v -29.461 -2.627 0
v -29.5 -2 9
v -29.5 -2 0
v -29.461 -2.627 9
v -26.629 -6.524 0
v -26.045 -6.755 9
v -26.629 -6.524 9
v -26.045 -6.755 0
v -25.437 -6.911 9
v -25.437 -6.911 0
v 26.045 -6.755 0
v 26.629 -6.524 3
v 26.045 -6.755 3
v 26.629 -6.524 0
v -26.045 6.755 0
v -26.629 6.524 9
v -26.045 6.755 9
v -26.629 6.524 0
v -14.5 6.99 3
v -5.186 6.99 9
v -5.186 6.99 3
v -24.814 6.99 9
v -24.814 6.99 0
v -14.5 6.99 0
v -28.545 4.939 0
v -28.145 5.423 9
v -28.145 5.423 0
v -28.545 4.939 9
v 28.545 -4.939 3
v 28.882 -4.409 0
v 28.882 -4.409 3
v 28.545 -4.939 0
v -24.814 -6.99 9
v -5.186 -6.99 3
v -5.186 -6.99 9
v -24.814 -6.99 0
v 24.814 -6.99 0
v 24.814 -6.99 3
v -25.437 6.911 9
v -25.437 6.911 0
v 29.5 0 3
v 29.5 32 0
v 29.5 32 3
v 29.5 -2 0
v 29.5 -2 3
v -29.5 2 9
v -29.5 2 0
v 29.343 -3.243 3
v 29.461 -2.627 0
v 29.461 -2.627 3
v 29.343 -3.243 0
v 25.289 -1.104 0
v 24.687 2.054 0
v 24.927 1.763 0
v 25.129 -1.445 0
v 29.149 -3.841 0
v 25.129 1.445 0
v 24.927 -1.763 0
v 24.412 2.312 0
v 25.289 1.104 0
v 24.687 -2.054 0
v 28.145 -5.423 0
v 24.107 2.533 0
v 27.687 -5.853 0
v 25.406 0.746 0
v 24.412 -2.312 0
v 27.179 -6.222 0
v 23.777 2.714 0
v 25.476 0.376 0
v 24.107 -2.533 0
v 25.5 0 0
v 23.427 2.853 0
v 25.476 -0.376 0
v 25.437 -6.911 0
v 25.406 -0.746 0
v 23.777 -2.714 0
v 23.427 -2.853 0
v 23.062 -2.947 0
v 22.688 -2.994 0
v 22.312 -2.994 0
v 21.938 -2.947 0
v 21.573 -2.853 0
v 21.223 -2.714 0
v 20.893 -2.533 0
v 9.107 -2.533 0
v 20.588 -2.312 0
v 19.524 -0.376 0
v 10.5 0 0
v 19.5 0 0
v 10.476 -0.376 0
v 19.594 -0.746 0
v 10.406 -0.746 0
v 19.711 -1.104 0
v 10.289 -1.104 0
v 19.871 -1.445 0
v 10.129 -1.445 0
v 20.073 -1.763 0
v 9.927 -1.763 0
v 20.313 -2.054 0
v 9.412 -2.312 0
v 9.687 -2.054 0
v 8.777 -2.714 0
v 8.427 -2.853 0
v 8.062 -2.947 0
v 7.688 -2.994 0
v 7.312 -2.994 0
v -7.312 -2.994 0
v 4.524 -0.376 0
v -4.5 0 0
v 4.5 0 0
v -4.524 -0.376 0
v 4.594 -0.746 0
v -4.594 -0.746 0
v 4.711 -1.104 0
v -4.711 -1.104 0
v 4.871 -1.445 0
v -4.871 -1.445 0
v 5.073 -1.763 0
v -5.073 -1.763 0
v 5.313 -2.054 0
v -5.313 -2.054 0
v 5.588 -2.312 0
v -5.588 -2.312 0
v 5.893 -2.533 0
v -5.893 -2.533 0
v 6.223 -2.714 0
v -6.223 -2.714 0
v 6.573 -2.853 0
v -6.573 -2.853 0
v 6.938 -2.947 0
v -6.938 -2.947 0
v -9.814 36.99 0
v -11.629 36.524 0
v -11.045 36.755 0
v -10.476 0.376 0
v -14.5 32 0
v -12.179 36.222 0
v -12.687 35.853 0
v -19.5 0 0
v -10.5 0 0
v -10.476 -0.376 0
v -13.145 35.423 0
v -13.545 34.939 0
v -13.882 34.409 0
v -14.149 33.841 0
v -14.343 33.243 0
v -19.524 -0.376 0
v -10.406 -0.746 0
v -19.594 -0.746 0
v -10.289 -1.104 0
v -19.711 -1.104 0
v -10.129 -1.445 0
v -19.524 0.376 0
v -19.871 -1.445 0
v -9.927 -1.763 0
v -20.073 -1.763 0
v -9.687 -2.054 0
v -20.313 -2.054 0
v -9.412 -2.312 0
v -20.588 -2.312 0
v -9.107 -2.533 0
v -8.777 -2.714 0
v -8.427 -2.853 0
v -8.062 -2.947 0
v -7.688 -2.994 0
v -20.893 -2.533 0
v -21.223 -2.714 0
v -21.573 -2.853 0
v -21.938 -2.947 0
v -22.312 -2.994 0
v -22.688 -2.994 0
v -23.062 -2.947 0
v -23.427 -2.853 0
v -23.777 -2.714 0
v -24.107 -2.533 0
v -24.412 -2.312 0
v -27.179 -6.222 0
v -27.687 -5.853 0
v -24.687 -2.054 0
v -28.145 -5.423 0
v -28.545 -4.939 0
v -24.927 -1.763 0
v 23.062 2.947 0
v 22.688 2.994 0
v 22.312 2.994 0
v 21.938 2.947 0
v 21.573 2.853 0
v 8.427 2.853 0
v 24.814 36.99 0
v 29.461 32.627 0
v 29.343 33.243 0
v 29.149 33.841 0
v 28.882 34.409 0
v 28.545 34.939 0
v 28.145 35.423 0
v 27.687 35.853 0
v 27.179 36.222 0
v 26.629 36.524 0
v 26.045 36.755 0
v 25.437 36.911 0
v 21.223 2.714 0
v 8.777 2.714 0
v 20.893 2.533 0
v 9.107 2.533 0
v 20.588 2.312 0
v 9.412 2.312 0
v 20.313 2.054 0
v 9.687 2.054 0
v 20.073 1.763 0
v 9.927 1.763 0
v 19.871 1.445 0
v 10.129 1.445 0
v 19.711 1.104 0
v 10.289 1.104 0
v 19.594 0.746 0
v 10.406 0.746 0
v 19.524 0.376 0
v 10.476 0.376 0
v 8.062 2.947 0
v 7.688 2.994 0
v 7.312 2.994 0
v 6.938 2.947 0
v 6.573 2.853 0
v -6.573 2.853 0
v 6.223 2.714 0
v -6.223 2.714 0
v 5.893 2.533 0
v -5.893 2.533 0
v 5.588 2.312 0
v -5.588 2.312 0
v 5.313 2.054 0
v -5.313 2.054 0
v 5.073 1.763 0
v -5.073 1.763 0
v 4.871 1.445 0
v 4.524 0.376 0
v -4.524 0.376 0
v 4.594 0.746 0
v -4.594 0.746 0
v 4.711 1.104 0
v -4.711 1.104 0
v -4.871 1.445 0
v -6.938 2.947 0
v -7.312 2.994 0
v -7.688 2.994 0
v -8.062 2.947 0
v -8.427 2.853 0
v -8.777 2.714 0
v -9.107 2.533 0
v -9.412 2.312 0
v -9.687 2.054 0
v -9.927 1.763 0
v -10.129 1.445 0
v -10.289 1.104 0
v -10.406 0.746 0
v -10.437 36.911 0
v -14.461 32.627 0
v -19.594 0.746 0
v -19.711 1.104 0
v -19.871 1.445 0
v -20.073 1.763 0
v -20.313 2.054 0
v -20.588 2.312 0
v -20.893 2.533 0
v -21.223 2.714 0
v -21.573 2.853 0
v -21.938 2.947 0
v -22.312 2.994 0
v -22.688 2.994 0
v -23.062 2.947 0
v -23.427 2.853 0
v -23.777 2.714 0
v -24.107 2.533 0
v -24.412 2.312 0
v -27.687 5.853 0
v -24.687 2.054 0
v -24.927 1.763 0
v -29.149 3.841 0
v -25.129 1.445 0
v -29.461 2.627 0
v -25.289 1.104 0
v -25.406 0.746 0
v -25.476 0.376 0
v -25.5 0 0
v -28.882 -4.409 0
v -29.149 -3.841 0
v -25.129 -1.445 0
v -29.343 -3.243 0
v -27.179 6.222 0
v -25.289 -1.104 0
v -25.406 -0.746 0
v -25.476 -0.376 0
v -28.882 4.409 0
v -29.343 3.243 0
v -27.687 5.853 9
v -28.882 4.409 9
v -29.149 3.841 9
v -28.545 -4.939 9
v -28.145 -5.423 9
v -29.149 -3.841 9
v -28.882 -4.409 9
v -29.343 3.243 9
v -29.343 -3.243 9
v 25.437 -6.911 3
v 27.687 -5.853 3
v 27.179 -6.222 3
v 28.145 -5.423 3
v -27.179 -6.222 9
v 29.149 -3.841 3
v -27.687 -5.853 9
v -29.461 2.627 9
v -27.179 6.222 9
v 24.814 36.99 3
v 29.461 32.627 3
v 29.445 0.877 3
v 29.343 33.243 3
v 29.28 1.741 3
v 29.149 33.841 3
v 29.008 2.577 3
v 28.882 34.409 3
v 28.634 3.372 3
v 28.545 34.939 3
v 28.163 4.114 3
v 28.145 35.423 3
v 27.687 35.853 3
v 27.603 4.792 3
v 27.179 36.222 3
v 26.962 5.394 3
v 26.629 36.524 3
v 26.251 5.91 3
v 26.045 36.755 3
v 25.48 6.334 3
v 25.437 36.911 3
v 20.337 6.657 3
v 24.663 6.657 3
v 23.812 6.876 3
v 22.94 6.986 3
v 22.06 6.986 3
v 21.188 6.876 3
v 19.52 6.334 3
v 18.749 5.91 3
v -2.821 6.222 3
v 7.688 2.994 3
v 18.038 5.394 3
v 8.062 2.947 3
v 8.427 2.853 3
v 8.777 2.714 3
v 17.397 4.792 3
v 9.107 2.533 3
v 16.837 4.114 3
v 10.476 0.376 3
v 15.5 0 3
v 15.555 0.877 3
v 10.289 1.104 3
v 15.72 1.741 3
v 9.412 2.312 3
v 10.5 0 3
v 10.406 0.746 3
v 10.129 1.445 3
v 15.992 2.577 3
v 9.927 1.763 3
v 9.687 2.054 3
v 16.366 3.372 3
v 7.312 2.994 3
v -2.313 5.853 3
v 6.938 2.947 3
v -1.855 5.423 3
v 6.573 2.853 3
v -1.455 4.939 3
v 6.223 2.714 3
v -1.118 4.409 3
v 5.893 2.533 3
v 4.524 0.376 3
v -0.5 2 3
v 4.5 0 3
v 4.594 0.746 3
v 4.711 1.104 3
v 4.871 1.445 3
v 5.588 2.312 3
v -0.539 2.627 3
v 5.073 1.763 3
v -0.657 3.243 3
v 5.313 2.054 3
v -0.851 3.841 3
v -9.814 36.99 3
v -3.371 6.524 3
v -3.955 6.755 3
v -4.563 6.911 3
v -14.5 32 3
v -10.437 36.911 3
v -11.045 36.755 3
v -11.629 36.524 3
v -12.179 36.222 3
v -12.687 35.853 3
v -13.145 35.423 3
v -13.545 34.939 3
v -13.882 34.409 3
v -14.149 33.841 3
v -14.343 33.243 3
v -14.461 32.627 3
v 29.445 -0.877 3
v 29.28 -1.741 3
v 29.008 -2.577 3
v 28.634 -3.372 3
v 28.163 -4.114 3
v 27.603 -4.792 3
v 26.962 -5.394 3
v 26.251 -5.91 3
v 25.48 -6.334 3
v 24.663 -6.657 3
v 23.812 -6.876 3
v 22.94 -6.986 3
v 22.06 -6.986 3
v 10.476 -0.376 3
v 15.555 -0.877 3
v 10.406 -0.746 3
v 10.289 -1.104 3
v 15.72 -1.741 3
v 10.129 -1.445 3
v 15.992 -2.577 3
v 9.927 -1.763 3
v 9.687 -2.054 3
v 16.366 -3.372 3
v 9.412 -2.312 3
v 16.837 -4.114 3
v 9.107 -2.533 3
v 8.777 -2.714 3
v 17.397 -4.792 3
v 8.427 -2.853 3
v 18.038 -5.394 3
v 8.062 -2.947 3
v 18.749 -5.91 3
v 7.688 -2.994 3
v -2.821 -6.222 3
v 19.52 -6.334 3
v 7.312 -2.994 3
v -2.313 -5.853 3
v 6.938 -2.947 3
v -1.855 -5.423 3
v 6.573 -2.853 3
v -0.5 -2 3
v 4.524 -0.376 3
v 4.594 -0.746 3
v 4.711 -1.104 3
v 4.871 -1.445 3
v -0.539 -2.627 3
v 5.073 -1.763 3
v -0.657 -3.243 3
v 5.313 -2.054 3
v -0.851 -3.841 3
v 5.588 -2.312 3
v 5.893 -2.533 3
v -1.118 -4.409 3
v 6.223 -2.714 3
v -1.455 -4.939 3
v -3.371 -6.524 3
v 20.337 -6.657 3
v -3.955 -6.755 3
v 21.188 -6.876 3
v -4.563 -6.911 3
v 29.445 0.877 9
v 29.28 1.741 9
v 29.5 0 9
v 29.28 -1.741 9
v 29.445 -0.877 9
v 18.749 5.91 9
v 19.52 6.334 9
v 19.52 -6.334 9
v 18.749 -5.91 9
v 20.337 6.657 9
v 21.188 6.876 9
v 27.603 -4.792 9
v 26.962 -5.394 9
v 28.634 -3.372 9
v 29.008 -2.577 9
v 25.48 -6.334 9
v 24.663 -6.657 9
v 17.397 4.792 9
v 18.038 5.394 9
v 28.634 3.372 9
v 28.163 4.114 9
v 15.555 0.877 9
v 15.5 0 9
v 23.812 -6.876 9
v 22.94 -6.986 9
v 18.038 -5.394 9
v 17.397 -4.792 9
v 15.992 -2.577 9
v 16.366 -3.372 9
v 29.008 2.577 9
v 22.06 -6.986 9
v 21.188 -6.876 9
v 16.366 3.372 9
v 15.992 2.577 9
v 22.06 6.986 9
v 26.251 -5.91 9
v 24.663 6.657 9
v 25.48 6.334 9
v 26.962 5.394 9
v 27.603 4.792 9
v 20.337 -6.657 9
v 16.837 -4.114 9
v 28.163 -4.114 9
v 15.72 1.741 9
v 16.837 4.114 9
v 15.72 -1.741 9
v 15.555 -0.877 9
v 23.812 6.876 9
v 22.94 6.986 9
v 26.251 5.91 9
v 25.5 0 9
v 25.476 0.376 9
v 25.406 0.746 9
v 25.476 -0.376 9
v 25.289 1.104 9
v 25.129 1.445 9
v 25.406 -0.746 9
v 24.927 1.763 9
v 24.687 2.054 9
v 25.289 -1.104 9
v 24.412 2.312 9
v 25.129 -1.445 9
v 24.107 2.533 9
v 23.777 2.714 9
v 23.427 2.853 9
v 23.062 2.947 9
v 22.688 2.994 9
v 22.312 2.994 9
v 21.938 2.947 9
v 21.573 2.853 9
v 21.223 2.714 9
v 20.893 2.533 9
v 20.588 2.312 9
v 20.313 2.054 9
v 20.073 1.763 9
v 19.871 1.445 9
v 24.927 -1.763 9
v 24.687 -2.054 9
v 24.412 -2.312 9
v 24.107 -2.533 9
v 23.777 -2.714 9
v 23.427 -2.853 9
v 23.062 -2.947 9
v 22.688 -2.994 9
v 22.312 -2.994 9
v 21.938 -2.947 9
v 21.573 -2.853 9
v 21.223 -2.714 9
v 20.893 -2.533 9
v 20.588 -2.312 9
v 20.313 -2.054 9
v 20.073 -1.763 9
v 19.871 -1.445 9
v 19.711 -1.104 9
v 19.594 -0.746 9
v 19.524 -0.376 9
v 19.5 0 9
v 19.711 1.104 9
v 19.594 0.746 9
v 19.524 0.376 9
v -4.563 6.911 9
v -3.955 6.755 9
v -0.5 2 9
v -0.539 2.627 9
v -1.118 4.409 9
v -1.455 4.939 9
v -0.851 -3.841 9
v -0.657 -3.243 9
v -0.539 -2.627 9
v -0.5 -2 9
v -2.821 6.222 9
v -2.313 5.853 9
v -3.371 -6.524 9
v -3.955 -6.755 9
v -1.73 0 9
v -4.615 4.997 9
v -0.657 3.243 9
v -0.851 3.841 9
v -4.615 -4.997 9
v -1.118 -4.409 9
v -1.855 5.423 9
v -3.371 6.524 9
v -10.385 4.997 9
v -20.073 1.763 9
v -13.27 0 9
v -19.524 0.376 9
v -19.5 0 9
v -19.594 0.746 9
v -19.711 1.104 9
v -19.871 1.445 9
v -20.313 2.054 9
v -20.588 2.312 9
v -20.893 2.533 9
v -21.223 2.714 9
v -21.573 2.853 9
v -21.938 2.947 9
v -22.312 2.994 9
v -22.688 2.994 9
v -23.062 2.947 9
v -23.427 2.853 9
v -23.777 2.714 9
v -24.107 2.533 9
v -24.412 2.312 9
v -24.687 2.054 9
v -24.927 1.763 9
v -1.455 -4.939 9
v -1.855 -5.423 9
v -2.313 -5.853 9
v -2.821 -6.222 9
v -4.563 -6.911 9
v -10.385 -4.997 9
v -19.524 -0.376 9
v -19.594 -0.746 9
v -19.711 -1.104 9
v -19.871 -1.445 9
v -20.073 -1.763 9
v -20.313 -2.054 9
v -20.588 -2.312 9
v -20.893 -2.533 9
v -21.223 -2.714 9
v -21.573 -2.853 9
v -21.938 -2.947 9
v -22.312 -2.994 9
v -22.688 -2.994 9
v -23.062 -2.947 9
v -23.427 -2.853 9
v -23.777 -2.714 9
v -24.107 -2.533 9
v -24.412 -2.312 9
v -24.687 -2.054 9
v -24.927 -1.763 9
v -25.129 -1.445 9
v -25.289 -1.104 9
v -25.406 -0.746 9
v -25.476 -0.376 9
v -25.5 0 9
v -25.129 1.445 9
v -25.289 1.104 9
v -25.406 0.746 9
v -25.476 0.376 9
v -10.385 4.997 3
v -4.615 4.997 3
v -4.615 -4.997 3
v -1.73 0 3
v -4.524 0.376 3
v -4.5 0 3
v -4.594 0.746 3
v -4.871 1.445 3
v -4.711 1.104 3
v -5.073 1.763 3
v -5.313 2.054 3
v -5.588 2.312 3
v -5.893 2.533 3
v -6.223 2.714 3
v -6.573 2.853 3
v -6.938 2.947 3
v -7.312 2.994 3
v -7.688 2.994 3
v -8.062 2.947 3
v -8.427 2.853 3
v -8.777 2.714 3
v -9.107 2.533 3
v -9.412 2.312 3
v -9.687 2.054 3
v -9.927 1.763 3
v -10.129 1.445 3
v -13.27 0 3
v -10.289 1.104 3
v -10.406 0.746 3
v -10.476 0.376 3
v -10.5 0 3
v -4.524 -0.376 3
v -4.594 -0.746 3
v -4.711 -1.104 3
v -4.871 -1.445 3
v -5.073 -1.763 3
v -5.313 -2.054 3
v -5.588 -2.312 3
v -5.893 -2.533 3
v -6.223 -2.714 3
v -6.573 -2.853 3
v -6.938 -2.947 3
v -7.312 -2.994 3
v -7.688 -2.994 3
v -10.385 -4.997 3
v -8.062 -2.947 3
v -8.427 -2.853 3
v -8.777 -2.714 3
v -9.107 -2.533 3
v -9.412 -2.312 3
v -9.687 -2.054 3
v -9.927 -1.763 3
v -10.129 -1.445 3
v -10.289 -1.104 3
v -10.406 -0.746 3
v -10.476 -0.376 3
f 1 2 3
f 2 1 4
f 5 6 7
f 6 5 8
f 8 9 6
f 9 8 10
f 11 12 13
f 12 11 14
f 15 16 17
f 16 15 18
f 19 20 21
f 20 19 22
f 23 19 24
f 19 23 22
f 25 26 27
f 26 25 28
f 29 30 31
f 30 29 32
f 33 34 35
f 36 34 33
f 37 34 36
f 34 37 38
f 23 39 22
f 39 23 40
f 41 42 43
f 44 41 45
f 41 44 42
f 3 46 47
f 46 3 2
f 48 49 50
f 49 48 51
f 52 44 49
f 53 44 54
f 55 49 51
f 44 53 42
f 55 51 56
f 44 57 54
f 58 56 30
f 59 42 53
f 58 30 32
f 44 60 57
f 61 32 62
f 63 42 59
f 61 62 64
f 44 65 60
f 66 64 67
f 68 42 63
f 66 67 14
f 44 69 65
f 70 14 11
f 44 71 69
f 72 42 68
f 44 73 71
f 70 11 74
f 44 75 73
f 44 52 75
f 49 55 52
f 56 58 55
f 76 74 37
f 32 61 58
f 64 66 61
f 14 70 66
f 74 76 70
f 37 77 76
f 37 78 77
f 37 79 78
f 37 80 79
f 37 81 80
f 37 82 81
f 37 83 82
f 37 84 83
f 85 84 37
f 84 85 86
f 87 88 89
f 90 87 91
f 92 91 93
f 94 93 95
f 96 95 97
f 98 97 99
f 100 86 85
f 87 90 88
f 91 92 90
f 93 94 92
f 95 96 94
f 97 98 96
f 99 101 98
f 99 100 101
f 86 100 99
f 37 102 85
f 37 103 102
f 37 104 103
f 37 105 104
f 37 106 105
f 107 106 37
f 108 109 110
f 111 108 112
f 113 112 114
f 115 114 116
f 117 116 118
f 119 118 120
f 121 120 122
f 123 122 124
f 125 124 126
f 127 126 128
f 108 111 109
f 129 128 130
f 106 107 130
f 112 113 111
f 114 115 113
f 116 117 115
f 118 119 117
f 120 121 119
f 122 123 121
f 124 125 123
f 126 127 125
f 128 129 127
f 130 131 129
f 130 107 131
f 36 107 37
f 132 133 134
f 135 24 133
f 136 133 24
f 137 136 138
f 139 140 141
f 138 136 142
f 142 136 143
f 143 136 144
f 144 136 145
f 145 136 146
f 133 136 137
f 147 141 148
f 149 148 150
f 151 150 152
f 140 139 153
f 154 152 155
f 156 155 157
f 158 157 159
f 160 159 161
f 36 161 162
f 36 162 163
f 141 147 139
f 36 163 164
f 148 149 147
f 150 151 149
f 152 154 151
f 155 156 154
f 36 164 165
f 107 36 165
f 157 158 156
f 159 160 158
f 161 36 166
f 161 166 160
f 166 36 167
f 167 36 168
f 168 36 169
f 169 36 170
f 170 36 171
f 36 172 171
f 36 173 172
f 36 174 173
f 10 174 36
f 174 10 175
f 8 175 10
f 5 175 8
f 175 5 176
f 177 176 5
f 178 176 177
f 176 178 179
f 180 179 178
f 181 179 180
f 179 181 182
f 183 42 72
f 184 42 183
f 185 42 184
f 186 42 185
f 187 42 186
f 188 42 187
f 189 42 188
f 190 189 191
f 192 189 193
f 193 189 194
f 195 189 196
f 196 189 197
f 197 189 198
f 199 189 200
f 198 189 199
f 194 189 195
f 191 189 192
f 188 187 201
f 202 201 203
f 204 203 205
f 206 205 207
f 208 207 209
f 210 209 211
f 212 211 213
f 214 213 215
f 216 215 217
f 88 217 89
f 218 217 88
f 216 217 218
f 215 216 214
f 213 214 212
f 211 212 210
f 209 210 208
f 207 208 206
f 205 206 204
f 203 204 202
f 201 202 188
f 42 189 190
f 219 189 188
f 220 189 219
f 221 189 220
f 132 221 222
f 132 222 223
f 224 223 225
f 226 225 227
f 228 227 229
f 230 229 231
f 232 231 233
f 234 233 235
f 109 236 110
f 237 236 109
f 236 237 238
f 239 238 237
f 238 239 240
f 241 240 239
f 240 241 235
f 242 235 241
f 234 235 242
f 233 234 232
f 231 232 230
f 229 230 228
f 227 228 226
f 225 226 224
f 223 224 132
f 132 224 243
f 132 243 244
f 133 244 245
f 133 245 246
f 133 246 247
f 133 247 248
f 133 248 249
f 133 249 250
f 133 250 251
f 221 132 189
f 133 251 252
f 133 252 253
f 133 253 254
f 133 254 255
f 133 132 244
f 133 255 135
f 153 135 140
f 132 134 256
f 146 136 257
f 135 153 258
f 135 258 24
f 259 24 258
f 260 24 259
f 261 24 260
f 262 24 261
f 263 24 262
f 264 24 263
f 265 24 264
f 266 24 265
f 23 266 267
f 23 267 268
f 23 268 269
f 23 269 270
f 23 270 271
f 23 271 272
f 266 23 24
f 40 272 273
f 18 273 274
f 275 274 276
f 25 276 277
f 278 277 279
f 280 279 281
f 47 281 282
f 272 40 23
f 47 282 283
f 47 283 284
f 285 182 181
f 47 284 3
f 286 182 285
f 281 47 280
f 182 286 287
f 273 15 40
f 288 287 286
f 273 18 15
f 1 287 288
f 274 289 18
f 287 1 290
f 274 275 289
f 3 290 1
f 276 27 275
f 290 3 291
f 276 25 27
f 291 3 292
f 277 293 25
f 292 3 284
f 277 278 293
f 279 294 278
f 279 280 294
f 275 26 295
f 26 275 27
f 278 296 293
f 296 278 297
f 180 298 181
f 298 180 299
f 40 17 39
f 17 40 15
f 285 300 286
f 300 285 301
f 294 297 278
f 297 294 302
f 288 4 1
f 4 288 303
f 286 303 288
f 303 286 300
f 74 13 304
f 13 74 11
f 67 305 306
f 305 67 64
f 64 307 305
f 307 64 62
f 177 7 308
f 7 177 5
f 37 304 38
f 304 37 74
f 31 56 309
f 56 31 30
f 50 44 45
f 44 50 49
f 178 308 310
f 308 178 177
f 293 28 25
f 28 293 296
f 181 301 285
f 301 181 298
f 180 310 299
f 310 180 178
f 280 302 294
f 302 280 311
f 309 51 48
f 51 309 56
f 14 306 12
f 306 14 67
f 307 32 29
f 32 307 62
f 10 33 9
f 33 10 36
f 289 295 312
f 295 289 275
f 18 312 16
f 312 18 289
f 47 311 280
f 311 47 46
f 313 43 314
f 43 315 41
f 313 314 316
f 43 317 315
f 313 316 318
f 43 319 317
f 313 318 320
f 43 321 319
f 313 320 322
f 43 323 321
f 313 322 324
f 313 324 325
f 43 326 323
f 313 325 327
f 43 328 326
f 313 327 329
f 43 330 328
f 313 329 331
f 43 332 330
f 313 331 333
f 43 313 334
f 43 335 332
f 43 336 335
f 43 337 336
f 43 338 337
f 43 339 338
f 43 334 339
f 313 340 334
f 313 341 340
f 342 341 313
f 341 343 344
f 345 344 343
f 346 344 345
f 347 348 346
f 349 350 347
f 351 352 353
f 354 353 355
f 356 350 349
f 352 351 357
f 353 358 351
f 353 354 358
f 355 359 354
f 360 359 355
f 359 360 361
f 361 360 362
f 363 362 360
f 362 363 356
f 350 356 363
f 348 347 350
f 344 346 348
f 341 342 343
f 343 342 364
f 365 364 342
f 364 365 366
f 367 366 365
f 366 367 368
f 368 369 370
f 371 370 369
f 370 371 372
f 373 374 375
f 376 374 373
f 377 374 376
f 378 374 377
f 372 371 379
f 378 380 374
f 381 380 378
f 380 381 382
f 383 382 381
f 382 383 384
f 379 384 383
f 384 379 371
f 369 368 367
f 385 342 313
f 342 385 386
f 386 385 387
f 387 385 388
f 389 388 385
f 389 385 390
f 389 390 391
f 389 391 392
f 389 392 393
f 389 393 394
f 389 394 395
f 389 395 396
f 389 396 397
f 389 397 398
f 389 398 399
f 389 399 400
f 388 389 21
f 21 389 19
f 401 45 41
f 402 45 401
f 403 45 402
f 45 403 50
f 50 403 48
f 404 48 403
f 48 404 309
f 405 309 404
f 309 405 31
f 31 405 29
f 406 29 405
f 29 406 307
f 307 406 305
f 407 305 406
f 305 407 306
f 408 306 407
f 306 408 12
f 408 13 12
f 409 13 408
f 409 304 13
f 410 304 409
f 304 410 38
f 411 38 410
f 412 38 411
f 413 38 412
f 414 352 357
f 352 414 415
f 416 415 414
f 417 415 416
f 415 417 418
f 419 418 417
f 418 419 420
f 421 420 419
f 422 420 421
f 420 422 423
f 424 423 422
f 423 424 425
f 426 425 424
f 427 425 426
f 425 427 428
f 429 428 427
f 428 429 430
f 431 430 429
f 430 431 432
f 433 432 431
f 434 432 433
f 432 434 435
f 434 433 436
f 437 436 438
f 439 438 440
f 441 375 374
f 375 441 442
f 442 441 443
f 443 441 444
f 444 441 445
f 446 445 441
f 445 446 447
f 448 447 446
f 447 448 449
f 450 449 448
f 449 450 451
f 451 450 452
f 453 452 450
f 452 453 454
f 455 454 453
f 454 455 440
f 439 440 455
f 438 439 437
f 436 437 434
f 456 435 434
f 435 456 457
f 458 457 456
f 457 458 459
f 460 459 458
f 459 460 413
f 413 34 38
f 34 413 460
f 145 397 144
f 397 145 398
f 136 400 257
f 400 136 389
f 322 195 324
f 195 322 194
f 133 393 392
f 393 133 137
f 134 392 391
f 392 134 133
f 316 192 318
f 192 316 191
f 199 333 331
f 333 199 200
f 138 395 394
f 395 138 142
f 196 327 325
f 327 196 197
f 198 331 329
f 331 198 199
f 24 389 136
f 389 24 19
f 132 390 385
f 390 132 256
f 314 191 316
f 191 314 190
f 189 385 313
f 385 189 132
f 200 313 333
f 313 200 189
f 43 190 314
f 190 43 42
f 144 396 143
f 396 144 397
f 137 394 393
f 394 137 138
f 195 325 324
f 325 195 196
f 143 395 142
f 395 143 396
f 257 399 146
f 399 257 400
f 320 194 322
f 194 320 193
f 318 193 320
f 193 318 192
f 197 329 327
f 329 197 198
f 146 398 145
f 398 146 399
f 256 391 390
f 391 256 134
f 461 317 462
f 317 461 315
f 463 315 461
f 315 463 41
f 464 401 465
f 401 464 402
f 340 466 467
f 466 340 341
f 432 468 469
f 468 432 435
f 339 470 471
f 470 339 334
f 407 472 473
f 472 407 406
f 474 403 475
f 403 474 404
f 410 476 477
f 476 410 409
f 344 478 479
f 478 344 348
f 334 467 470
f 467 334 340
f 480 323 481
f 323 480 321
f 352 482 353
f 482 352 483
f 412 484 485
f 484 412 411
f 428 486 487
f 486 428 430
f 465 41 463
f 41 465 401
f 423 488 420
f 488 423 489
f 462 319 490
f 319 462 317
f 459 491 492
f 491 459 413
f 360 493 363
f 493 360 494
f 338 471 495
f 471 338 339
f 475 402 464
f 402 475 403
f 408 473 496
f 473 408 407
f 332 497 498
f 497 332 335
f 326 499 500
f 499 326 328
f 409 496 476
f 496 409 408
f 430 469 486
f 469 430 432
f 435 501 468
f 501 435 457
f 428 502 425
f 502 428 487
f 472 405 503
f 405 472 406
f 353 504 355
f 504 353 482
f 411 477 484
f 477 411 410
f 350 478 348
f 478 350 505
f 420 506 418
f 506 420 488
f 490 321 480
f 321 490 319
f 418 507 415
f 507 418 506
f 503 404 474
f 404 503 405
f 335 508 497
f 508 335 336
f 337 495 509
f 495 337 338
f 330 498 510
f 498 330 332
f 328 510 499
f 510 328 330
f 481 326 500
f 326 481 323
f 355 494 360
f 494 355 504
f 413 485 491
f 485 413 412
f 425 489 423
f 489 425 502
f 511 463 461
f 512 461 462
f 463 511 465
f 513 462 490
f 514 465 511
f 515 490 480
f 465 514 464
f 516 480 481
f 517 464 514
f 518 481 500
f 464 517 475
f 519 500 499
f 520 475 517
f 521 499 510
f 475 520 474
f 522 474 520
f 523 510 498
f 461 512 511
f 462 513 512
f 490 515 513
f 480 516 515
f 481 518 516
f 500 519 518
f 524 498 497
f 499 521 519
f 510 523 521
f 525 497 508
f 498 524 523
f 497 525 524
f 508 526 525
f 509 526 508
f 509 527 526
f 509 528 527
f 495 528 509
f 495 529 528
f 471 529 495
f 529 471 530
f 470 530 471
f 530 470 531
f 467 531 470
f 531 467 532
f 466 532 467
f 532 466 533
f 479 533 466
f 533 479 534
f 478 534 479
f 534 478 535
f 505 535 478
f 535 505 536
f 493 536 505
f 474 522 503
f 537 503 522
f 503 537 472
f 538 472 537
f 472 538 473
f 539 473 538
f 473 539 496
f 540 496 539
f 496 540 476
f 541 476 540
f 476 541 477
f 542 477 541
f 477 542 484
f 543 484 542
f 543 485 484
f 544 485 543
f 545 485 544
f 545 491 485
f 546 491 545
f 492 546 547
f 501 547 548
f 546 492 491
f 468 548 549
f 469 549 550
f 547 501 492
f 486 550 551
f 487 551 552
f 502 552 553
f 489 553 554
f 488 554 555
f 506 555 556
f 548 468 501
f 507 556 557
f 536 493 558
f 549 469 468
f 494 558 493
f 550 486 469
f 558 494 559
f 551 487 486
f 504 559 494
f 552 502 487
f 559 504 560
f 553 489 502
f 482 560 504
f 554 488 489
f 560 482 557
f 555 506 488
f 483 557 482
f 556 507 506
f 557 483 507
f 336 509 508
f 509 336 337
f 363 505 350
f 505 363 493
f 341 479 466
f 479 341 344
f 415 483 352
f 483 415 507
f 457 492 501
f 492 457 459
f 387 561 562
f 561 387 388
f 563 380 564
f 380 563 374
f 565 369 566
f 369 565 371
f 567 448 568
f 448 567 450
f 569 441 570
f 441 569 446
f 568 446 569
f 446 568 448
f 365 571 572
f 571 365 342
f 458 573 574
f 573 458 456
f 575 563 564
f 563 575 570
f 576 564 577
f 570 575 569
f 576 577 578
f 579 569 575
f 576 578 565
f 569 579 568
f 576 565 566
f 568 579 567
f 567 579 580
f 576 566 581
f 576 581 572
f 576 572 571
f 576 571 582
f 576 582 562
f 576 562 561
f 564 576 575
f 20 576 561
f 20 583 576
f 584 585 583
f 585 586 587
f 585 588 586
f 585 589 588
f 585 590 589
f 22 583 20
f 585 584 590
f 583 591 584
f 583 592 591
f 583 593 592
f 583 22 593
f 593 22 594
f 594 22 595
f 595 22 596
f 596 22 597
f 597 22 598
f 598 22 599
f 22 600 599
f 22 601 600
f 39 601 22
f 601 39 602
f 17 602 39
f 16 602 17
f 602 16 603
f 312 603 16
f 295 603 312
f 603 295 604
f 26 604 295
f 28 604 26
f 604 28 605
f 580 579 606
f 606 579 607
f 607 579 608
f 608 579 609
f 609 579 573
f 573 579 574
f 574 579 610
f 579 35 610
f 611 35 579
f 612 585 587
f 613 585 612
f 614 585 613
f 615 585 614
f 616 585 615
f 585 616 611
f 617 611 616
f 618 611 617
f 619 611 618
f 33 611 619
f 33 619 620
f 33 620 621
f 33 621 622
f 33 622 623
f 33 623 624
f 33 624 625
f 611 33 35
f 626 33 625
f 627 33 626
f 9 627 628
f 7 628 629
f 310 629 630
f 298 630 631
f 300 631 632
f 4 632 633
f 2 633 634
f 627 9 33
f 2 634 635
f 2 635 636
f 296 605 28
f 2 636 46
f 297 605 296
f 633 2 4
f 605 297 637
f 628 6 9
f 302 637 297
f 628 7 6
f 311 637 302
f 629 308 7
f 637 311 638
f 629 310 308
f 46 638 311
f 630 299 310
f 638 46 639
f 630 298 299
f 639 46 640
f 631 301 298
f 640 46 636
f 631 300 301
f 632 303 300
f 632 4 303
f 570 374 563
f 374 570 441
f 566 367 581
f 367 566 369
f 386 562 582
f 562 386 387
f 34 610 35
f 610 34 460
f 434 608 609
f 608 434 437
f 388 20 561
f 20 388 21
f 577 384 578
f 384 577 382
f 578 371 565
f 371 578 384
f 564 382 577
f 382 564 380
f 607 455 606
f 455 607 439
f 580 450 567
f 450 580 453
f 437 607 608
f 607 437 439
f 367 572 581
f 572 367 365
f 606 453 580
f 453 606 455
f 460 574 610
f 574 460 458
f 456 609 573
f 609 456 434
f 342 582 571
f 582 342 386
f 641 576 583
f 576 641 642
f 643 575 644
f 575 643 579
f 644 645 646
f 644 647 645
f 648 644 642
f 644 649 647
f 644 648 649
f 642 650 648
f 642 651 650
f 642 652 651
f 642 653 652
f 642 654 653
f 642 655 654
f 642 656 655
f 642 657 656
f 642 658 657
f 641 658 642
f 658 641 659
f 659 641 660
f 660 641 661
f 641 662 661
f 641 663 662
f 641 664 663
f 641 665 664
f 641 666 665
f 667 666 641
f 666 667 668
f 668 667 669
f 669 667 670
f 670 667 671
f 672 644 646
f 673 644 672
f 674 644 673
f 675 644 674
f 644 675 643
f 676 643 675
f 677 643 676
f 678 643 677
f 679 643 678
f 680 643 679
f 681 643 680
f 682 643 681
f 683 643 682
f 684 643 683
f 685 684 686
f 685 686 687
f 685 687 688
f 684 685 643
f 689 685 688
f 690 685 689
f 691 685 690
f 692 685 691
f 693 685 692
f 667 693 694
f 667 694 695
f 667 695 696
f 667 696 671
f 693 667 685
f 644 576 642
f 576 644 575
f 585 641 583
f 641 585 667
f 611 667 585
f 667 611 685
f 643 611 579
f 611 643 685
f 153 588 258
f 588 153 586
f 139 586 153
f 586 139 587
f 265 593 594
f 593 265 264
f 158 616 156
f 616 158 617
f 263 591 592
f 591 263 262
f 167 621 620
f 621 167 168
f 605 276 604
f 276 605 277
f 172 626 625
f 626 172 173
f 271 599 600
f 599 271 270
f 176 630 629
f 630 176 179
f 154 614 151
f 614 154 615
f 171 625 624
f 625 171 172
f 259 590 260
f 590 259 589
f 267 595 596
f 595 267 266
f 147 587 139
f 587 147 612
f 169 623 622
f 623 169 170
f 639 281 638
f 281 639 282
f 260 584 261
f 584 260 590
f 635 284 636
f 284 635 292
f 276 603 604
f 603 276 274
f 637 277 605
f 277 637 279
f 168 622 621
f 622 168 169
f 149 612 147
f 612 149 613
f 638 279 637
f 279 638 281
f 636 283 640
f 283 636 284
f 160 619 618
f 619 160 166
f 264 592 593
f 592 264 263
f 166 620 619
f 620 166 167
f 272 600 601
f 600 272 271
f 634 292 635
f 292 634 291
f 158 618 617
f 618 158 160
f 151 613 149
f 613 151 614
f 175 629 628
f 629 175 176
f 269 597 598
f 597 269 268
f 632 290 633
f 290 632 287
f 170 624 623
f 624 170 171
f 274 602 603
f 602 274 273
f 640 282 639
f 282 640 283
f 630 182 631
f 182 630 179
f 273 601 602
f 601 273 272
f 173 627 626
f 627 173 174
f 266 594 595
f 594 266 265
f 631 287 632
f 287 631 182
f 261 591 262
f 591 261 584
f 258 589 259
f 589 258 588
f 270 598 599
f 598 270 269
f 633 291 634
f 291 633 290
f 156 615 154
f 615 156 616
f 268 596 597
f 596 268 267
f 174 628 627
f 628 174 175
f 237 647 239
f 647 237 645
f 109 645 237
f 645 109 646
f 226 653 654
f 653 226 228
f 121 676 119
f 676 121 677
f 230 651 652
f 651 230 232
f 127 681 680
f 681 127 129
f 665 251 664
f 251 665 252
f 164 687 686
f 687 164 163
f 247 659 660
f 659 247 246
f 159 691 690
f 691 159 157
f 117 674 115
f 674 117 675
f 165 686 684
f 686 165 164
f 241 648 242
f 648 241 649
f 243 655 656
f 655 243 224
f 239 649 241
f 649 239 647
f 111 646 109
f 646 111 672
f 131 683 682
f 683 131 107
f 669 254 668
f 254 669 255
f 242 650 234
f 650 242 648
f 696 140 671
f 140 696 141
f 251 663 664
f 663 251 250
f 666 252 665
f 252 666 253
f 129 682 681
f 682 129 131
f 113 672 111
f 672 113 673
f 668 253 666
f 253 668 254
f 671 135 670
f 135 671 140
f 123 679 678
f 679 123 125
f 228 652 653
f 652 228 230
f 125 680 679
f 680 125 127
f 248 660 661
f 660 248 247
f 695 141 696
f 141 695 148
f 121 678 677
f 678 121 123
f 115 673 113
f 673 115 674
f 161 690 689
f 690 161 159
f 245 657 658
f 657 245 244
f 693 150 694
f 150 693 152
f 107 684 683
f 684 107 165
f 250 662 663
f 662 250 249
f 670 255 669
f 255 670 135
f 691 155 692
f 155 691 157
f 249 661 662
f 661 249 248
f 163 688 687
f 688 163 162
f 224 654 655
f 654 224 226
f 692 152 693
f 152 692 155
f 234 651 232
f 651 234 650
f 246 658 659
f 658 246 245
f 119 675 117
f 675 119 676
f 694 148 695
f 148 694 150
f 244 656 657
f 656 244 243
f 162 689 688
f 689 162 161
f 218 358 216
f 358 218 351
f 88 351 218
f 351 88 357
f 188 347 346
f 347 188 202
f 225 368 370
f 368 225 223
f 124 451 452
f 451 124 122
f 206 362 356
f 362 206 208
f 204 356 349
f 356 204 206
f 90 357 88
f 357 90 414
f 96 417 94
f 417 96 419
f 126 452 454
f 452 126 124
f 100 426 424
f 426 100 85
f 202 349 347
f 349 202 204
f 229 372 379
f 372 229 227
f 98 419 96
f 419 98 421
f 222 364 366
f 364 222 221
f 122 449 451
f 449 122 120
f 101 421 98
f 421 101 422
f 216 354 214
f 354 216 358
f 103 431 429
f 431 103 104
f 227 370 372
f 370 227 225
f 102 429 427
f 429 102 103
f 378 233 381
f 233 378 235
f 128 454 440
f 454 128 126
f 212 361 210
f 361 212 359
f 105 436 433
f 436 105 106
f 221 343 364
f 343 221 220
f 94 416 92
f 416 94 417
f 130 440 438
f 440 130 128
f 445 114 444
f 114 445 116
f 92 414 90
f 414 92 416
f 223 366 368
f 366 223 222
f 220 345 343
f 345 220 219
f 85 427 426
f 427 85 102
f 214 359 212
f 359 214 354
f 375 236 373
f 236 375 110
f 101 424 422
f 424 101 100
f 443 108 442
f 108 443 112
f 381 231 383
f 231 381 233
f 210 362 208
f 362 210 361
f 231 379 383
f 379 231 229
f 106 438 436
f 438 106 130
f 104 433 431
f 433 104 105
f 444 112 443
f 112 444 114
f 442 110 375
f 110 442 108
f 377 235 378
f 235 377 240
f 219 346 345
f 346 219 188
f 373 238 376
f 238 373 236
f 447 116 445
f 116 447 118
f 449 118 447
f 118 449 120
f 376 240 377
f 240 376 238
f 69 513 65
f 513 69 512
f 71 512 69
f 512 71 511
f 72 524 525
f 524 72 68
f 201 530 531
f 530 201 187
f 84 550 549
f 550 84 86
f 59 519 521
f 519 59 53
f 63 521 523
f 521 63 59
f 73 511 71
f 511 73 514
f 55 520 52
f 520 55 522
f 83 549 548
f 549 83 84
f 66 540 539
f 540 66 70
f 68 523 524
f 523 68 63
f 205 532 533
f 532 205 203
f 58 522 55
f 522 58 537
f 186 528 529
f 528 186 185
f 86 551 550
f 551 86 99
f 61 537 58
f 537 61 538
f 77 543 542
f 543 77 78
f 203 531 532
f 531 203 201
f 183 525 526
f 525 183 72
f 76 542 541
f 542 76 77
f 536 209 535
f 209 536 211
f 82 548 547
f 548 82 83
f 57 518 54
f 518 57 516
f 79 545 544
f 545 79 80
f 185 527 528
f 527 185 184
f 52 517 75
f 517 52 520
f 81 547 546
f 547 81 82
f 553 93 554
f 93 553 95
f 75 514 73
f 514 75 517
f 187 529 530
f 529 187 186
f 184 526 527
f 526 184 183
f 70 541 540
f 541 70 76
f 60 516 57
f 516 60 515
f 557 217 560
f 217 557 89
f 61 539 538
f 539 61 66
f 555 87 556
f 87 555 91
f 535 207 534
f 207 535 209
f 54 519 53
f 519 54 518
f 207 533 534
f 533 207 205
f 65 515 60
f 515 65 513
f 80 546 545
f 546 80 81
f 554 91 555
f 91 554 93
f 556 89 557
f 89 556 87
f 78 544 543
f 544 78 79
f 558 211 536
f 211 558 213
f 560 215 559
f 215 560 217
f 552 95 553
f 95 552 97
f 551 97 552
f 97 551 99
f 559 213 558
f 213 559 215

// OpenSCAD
$fn = 50;


difference() {
	union() {
		hull() {
			translate(v = [-24.5000000000, 2.0000000000, 0]) {
				cylinder(h = 3, r = 5);
			}
			translate(v = [24.5000000000, 2.0000000000, 0]) {
				cylinder(h = 3, r = 5);
			}
			translate(v = [-24.5000000000, -2.0000000000, 0]) {
				cylinder(h = 3, r = 5);
			}
			translate(v = [24.5000000000, -2.0000000000, 0]) {
				cylinder(h = 3, r = 5);
			}
		}
		translate(v = [7.5000000000, 15.0000000000, 0]) {
			hull() {
				translate(v = [-17.0000000000, 17.0000000000, 0]) {
					cylinder(h = 3, r = 5);
				}
				translate(v = [17.0000000000, 17.0000000000, 0]) {
					cylinder(h = 3, r = 5);
				}
				translate(v = [-17.0000000000, -17.0000000000, 0]) {
					cylinder(h = 3, r = 5);
				}
				translate(v = [17.0000000000, -17.0000000000, 0]) {
					cylinder(h = 3, r = 5);
				}
			}
		}
		translate(v = [22.5000000000, 0, 0]) {
			cylinder(h = 9, r = 7.0000000000);
		}
		translate(v = [-15.0000000000, 0, 0]) {
			hull() {
				translate(v = [-9.5000000000, 2.0000000000, 0]) {
					cylinder(h = 9, r = 5);
				}
				translate(v = [9.5000000000, 2.0000000000, 0]) {
					cylinder(h = 9, r = 5);
				}
				translate(v = [-9.5000000000, -2.0000000000, 0]) {
					cylinder(h = 9, r = 5);
				}
				translate(v = [9.5000000000, -2.0000000000, 0]) {
					cylinder(h = 9, r = 5);
				}
			}
		}
	}
	union() {
		translate(v = [-7.5000000000, 0, 9]) {
			rotate(a = [0, 0, 0]) {
				difference() {
					union() {
						translate(v = [0, 0, -6]) {
							linear_extrude(height = 6) {
								polygon(points = [[5.7700000000, 0.0000000000], [2.8850000000, 4.9969665798], [-2.8850000000, 4.9969665798], [-5.7700000000, 0.0000000000], [-2.8850000000, -4.9969665798], [2.8850000000, -4.9969665798]]);
							}
						}
					}
					union();
				}
			}
		}
		translate(v = [-22.5000000000, 0.0000000000, 0]) {
			translate(v = [0, 0, -100]) {
				cylinder(h = 200, r = 3.0000000000);
			}
		}
		translate(v = [-7.5000000000, 0.0000000000, 0]) {
			translate(v = [0, 0, -100]) {
				cylinder(h = 200, r = 3.0000000000);
			}
		}
		translate(v = [7.5000000000, 0.0000000000, 0]) {
			translate(v = [0, 0, -100]) {
				cylinder(h = 200, r = 3.0000000000);
			}
		}
		translate(v = [22.5000000000, 0.0000000000, 0]) {
			translate(v = [0, 0, -100]) {
				cylinder(h = 200, r = 3.0000000000);
			}
		}
	}
}
